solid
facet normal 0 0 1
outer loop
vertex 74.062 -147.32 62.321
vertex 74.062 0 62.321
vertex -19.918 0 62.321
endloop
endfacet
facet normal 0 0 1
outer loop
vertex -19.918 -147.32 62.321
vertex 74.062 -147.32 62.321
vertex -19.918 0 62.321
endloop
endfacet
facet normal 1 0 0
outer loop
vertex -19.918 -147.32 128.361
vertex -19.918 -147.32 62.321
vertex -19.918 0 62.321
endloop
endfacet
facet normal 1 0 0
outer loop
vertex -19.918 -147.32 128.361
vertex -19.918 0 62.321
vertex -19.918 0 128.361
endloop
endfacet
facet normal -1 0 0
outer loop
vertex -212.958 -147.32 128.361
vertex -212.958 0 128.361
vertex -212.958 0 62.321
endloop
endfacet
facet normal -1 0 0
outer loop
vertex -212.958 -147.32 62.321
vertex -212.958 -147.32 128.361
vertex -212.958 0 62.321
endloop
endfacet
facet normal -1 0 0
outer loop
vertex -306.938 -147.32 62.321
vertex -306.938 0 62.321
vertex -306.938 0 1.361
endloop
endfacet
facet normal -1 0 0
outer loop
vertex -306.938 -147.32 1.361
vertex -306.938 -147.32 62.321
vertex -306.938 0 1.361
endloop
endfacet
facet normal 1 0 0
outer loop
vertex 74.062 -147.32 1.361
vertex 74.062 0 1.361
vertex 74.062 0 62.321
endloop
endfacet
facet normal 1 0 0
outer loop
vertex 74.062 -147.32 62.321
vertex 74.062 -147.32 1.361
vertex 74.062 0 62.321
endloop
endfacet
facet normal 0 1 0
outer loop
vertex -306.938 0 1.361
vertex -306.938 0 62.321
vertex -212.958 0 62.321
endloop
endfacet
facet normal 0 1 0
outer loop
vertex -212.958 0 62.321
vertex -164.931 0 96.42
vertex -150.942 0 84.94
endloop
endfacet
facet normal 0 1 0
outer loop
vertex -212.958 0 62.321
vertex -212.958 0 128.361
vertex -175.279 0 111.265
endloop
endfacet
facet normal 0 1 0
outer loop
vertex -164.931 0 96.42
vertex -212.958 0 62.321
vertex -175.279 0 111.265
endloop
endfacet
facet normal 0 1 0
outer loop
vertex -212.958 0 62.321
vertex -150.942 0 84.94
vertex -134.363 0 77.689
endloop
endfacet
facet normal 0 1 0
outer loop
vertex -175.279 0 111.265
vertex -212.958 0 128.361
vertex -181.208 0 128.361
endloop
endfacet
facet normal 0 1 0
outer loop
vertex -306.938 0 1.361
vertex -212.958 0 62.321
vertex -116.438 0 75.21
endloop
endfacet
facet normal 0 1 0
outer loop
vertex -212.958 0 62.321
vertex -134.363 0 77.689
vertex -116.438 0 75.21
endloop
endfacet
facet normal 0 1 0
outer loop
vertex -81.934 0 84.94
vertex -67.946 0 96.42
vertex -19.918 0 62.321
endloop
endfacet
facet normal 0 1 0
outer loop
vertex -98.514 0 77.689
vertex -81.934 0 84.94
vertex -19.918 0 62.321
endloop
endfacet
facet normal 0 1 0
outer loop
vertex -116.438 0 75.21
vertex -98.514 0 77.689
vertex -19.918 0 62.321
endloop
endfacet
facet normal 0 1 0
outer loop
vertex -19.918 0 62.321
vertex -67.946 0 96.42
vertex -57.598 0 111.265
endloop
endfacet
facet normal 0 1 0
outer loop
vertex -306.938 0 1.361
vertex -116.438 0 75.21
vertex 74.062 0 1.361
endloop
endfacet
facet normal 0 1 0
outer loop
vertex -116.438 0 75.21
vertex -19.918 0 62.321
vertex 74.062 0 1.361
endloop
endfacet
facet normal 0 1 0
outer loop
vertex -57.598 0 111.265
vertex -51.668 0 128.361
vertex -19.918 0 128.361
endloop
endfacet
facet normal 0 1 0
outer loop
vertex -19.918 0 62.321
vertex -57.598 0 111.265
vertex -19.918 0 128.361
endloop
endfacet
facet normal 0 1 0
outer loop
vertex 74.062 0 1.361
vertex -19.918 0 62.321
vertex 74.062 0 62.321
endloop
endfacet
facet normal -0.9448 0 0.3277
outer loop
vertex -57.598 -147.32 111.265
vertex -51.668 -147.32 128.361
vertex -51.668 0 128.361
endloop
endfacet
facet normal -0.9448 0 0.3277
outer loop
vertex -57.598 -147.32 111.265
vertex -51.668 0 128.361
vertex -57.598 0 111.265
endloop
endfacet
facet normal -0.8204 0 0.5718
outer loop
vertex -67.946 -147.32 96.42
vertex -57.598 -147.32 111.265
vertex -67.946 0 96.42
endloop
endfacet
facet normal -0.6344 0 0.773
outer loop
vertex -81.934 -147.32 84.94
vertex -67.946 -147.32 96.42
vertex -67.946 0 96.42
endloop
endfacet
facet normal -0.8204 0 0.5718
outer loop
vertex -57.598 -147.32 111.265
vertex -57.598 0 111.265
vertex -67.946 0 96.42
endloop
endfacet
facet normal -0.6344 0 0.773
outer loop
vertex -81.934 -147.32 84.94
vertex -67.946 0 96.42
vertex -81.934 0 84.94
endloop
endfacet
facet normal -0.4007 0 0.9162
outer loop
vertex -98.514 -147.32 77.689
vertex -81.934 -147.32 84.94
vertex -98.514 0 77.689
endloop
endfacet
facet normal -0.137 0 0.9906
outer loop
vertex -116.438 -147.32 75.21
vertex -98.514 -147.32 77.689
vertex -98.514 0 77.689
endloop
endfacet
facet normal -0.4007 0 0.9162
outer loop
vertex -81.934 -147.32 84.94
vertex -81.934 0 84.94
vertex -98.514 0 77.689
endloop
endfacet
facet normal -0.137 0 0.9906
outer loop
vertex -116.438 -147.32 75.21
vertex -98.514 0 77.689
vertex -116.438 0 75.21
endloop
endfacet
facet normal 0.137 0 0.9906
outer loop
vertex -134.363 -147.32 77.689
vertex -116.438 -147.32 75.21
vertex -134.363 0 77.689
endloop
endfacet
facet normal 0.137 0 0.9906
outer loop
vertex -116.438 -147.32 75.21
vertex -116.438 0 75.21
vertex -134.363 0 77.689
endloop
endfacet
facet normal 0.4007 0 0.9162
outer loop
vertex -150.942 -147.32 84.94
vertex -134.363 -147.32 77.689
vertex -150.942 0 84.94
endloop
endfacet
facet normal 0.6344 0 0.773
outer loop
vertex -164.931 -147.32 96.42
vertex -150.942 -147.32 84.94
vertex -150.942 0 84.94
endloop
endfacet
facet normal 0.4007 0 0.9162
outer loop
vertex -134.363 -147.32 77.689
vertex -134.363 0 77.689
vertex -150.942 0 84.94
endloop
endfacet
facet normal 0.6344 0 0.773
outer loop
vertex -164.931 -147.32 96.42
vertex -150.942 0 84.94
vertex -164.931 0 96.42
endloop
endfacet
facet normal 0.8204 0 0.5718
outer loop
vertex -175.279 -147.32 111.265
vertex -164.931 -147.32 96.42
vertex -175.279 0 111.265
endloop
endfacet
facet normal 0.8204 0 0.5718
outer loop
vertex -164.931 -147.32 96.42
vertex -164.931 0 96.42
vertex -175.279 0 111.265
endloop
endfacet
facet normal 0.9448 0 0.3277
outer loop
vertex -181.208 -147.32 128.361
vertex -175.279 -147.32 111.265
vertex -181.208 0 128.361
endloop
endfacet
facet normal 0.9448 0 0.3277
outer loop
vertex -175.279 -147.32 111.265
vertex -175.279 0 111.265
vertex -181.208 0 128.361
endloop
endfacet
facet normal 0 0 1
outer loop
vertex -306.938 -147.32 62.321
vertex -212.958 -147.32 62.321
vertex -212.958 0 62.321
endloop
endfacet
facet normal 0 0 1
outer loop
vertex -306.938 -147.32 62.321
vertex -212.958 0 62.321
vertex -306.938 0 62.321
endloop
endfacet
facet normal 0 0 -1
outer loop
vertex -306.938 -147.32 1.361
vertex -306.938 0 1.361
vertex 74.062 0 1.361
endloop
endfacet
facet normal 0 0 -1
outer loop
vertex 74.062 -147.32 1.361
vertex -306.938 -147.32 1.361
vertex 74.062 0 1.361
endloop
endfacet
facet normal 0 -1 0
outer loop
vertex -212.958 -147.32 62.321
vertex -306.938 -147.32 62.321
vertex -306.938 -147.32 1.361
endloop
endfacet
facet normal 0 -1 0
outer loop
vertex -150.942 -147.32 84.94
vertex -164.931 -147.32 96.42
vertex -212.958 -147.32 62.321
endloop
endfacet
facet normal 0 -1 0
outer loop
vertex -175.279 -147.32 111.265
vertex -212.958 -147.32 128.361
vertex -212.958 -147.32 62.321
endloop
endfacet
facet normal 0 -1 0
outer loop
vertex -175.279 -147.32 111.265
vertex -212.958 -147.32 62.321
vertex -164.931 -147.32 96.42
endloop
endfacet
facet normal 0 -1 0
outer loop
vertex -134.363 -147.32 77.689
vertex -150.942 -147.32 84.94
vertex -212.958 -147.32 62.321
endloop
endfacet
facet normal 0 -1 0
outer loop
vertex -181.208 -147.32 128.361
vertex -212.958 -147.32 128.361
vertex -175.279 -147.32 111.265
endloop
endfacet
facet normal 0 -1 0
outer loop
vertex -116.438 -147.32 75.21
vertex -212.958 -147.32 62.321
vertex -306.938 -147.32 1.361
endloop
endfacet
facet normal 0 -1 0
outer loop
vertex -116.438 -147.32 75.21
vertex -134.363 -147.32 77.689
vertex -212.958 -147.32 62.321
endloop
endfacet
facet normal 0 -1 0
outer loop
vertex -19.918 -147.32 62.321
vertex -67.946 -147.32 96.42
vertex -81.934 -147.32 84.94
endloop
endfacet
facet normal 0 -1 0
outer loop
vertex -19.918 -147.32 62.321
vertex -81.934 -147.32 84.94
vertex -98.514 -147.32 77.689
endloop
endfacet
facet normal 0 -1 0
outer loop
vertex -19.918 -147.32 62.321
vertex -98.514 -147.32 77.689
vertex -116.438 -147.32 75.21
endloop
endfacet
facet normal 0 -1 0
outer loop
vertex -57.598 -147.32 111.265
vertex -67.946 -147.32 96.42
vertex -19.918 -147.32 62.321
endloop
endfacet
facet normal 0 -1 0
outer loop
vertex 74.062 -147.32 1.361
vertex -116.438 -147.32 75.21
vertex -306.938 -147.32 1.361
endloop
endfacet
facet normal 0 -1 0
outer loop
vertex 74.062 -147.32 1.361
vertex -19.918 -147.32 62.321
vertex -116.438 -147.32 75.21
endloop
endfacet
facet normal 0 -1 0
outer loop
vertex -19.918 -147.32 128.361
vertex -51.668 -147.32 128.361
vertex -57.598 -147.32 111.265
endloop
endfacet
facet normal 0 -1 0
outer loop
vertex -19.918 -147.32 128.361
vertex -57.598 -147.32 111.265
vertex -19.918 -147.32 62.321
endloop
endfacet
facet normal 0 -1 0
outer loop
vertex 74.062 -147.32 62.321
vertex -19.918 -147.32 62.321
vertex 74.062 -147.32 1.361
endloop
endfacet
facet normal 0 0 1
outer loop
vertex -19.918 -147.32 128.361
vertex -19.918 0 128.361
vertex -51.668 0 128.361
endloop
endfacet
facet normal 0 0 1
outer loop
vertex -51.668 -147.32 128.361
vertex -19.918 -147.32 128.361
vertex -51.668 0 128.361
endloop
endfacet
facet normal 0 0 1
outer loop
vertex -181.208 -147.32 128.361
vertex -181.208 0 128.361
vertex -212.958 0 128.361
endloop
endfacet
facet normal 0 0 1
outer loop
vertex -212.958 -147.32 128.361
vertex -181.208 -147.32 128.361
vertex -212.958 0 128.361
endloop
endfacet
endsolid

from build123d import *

# Parameters (mm, degrees)
F1_DEPTH = 147.32


with BuildPart() as f1:
    # F0 (on Front) → F1 (new body)
    with BuildSketch(Plane.XZ):
        Polygon((-212.958432, 62.320832), (-306.938432, 62.320832), (-306.938432, 1.360832), (74.061568, 1.360832), (74.061568, 62.320832), (-19.918432, 62.320832), align=None)
        with BuildLine():
            Line((-212.958432, 128.360832), (-212.958432, 62.320832))
            Line((-212.958432, 62.320832), (-19.918432, 62.320832))
            Line((-19.918432, 62.320832), (-19.918432, 128.360832))
            Line((-19.918432, 128.360832), (-51.668432, 128.360832))
            ThreePointArc((-51.668432, 128.360832), (-116.438432, 75.209924), (-181.208432, 128.360832))
            Line((-181.208432, 128.360832), (-212.958432, 128.360832))
        make_face()
    extrude(amount=F1_DEPTH)


solid = f1.part
